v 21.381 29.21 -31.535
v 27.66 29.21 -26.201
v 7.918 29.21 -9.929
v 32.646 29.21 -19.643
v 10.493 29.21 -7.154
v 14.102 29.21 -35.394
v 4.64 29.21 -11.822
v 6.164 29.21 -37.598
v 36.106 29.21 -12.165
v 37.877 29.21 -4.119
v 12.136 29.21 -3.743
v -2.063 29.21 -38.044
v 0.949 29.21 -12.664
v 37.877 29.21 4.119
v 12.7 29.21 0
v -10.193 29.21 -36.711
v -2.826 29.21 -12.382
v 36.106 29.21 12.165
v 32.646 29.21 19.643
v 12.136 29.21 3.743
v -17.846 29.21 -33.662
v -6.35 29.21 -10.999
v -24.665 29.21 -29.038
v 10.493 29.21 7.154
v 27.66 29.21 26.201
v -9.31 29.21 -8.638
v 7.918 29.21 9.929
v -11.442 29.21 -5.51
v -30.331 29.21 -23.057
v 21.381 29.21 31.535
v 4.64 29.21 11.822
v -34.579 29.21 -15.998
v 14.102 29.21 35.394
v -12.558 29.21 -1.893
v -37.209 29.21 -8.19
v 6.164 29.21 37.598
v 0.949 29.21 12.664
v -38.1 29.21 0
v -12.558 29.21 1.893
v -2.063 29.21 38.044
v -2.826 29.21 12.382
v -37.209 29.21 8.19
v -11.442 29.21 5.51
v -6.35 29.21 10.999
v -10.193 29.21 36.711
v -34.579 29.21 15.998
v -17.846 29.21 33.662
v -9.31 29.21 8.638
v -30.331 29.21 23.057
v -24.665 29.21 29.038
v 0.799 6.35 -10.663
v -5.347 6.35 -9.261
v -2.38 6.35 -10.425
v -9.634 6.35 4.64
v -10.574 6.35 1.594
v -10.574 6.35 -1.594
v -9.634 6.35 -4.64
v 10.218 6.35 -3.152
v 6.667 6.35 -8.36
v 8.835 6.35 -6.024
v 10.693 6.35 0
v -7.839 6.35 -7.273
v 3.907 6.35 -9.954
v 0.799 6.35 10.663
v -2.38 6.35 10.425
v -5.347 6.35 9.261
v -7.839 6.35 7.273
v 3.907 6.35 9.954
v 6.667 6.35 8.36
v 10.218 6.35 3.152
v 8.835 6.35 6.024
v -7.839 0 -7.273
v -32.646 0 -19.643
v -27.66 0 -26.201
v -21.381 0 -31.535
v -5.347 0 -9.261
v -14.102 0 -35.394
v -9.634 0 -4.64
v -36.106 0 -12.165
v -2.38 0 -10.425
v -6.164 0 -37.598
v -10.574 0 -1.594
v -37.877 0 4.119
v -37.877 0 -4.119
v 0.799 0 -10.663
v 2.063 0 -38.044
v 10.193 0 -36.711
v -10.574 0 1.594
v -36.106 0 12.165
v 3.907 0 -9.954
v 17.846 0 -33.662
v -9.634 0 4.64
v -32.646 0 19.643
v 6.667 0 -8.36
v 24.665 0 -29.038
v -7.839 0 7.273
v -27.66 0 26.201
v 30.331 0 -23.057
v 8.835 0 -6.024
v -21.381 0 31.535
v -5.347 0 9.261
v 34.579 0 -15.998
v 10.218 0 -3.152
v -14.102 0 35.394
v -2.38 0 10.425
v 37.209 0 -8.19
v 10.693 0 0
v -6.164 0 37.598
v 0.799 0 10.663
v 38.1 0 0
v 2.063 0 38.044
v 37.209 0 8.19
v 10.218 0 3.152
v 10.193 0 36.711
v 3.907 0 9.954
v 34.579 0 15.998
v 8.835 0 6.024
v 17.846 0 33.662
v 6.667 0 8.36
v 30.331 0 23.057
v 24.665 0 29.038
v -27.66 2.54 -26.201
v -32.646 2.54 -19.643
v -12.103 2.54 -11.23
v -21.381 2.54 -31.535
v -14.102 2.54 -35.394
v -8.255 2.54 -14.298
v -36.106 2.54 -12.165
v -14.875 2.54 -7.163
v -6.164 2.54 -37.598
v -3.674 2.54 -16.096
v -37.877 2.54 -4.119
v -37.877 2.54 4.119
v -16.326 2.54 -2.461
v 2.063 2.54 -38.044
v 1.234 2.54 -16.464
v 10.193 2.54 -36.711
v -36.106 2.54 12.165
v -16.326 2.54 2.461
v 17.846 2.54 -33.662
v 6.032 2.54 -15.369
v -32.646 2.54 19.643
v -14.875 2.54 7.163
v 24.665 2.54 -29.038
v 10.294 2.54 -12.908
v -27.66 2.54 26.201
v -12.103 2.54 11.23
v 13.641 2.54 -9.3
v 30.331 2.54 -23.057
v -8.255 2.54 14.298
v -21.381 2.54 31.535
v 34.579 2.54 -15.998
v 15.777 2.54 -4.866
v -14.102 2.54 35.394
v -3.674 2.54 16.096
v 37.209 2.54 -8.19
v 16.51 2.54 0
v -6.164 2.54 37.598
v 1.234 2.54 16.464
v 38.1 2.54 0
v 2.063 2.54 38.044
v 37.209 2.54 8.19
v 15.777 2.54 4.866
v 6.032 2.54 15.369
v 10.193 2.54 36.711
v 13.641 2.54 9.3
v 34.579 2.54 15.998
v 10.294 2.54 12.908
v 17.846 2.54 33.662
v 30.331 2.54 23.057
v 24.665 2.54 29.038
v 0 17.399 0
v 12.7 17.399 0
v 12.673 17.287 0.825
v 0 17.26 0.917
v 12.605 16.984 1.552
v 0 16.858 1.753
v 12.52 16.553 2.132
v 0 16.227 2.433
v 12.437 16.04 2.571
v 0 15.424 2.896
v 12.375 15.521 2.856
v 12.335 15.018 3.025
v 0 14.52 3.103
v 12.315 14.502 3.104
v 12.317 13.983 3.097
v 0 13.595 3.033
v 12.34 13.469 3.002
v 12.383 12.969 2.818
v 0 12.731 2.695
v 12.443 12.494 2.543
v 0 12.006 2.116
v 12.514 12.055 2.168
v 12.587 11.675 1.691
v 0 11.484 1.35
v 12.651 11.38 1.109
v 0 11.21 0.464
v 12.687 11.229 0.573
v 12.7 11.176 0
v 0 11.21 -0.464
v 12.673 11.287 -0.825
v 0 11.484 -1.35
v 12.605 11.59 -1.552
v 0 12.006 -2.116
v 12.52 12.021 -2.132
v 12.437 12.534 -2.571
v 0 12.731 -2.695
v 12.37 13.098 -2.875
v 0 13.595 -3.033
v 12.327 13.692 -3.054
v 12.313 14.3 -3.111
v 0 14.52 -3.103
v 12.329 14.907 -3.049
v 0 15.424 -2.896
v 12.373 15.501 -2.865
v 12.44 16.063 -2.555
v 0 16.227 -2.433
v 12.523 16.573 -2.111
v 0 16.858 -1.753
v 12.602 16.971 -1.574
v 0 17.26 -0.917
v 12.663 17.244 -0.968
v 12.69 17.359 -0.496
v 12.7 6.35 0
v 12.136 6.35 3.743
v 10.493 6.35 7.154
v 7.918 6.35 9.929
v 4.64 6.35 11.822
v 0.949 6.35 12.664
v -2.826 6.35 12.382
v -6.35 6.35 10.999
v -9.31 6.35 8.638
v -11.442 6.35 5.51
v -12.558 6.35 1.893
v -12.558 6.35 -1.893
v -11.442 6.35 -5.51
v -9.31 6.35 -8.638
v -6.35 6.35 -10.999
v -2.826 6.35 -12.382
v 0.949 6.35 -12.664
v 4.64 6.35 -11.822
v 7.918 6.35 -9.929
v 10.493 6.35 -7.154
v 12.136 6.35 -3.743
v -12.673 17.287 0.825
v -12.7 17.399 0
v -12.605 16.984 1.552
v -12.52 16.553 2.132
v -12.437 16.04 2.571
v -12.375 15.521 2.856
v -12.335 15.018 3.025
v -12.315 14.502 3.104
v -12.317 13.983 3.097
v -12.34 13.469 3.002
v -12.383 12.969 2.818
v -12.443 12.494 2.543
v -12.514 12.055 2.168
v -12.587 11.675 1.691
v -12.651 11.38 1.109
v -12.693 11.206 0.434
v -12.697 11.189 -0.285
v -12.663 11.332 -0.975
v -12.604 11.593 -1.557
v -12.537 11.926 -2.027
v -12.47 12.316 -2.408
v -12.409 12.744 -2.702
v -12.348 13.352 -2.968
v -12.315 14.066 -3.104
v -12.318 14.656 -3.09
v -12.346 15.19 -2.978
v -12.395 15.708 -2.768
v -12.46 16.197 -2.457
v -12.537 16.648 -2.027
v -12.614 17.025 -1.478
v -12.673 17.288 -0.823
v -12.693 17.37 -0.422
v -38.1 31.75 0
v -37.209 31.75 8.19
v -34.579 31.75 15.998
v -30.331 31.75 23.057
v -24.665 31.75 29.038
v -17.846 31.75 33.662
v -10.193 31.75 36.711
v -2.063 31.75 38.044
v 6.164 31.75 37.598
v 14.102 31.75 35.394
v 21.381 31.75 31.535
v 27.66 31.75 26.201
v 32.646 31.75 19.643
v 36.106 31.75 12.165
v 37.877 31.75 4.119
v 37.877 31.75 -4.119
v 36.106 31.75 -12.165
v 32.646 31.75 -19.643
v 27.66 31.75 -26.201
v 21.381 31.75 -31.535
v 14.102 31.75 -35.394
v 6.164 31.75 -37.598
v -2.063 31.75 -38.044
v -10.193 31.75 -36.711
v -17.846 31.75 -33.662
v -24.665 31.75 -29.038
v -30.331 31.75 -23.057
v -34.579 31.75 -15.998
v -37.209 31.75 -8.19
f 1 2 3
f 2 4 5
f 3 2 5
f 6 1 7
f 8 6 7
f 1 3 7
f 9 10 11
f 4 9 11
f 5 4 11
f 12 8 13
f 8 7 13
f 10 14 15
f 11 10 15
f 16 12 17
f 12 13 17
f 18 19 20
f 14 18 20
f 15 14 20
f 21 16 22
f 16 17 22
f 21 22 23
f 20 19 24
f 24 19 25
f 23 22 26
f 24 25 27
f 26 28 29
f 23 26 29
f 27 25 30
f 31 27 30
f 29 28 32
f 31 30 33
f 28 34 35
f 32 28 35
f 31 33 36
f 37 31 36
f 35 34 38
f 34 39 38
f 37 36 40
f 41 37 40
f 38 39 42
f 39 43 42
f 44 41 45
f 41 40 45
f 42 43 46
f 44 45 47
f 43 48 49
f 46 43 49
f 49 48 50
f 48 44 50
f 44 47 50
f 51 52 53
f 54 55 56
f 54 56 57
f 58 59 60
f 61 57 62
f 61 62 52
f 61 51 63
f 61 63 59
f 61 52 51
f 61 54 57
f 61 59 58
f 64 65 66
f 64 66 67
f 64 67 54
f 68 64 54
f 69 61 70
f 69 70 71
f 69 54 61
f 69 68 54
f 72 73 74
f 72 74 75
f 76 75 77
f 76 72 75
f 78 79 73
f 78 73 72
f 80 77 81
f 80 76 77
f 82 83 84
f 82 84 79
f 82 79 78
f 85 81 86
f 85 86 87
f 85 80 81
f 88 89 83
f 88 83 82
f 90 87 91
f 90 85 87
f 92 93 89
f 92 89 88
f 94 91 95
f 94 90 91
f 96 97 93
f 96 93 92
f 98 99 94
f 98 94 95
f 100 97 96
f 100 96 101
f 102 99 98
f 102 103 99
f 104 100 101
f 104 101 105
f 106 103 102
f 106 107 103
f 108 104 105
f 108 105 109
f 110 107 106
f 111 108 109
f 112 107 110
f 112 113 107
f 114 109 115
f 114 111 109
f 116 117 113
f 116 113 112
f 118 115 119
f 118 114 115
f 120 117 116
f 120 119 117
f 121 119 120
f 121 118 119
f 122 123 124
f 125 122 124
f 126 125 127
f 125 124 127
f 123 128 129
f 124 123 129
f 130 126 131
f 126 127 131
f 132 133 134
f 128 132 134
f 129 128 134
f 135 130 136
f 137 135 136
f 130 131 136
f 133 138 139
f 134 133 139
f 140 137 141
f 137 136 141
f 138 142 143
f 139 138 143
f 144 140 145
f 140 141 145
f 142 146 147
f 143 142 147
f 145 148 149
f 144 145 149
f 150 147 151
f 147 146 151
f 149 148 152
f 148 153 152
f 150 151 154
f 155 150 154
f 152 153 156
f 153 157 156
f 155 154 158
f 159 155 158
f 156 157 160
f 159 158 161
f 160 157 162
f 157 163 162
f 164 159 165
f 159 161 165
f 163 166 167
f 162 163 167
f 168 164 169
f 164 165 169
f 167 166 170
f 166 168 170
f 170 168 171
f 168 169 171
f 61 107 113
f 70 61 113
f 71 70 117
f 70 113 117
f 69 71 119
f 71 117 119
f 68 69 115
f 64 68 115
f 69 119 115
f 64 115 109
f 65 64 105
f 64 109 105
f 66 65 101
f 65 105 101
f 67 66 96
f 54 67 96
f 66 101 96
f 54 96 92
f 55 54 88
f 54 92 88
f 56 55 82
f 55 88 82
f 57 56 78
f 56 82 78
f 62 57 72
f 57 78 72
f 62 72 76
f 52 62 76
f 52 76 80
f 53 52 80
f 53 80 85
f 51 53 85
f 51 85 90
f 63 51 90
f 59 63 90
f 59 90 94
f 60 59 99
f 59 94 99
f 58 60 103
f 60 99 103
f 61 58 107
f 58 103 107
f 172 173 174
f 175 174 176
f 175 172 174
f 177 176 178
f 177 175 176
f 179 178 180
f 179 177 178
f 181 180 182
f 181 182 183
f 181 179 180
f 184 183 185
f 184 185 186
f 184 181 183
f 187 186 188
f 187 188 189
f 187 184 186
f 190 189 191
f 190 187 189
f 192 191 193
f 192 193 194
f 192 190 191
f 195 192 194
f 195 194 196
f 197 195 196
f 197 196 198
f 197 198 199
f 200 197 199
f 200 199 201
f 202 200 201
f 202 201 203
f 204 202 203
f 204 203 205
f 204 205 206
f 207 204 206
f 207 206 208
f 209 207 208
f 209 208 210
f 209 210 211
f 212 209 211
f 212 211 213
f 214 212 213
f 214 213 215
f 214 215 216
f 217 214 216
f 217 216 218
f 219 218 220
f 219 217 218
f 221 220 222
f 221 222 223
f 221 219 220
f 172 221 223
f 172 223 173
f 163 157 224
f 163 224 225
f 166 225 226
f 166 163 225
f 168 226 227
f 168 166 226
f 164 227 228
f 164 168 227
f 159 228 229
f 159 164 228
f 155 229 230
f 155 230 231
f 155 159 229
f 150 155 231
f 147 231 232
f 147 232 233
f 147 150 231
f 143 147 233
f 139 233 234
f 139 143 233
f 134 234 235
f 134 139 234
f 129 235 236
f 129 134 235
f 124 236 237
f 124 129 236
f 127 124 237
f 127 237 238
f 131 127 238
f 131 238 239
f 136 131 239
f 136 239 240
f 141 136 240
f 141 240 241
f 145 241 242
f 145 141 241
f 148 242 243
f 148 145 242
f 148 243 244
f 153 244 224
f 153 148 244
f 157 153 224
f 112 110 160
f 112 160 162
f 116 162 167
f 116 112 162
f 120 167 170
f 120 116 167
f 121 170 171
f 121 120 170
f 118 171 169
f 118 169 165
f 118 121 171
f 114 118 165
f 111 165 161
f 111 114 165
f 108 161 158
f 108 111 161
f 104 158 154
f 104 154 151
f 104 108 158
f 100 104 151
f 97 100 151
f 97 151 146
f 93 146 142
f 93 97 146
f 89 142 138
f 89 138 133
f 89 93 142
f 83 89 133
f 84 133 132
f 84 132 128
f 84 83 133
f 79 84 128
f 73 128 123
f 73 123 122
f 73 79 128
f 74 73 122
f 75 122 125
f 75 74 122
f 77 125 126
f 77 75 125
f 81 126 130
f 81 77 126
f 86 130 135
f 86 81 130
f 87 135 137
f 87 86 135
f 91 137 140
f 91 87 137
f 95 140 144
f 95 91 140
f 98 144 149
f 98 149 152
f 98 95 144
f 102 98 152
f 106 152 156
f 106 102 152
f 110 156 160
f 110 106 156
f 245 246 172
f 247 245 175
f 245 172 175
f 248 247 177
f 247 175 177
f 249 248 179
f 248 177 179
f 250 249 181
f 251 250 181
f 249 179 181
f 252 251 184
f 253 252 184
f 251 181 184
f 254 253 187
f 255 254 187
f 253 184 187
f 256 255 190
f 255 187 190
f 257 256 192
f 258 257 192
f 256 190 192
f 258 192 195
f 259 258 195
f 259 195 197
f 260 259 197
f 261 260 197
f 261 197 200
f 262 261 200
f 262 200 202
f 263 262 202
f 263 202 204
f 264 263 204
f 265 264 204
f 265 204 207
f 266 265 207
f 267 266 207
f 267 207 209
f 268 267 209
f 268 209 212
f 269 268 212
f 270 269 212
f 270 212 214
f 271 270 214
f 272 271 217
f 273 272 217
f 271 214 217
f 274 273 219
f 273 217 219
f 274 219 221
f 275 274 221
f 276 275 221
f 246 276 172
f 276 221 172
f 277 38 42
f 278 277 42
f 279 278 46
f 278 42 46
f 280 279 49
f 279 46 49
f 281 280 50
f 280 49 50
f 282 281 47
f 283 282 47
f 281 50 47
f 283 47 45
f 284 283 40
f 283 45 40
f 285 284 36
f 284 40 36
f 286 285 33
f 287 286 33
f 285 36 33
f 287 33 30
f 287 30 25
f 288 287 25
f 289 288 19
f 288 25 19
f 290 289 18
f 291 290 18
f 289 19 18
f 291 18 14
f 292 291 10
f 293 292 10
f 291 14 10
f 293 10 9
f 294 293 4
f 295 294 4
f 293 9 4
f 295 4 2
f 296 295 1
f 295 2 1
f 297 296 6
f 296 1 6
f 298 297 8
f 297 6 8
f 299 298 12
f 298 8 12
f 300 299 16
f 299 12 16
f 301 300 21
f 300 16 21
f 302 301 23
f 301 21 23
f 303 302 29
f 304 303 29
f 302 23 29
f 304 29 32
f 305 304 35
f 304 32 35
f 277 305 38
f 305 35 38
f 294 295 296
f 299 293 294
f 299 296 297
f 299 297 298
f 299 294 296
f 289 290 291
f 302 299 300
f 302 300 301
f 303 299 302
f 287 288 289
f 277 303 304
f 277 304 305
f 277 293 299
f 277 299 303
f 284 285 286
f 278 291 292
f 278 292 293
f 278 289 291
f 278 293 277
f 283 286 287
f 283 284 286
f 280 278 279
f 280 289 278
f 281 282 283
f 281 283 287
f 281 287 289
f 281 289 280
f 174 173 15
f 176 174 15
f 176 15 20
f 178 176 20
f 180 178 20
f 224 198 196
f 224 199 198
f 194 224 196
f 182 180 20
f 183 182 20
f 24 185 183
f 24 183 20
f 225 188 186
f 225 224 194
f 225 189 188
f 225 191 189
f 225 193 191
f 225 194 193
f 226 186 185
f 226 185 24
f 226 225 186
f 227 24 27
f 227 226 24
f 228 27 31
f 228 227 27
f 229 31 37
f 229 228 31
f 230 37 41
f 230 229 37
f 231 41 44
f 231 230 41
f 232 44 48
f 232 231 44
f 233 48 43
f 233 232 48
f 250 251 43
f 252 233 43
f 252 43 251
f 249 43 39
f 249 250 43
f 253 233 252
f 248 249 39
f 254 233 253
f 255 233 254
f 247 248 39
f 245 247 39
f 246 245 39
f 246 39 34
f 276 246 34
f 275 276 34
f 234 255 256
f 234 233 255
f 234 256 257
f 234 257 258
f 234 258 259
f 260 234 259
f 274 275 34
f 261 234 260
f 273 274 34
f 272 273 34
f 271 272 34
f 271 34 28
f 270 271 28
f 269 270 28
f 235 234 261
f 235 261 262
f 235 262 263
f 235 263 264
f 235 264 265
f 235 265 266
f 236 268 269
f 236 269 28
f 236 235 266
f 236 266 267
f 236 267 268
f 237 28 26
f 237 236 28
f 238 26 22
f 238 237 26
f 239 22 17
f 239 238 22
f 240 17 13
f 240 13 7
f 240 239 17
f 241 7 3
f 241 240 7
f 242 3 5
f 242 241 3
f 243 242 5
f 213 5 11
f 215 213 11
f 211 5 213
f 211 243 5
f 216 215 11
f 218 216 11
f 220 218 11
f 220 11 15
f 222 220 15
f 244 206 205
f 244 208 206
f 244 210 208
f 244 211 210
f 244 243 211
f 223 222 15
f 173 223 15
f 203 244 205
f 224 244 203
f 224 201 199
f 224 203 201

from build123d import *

# Parameters (mm, degrees)
F0_R          = 38.1
F1_DEPTH      = 2.54
F2_R          = 12.7
F3_DEPTH      = 29.21
F4_R          = 10.6934
F5_DEPTH      = 6.35
F6_R          = 38.1
F7_DEPTH      = 2.54
F8_R          = 3.1115
F9_DEPTH      = 25.4
F9_DEPTH_BACK = 25.4
F10_SIZE      = 3.81


with BuildPart() as f1:
    # F0 (on Front) → F1 (new body)
    with BuildSketch(Plane.XZ):
        Circle(F0_R)
    extrude(amount=-F1_DEPTH)

    # F2 (on Front) → F3 (join)
    with BuildSketch(Plane.XZ):
        Circle(F2_R)
    extrude(amount=-F3_DEPTH)

    # F4 (on Front) → F5 (cut)
    with BuildSketch(Plane.XZ):
        Circle(F4_R)
    extrude(amount=-F5_DEPTH, mode=Mode.SUBTRACT)

    # F6 (on face) → F7 (join)
    with BuildSketch(Plane(origin=(0, 29.21, 0), x_dir=(-1, 0, 0), z_dir=(0, 1, 0))):
        Circle(F6_R)
    extrude(amount=F7_DEPTH)

    # F8 (on Right) → F9 (cut, two sides)
    with BuildSketch(Plane.YZ) as f9_sk:
        with Locations((14.287057, 0)):
            Circle(F8_R)
    extrude(amount=F9_DEPTH, mode=Mode.SUBTRACT)
    extrude(f9_sk.sketch, amount=-F9_DEPTH_BACK, mode=Mode.SUBTRACT)

    # F10
    f10_edges = [f1.edges().sort_by_distance(p)[0] for p in [
        (-12.7, 2.54, 0),
    ]]
    chamfer(f10_edges, length=F10_SIZE)


solid = f1.part
